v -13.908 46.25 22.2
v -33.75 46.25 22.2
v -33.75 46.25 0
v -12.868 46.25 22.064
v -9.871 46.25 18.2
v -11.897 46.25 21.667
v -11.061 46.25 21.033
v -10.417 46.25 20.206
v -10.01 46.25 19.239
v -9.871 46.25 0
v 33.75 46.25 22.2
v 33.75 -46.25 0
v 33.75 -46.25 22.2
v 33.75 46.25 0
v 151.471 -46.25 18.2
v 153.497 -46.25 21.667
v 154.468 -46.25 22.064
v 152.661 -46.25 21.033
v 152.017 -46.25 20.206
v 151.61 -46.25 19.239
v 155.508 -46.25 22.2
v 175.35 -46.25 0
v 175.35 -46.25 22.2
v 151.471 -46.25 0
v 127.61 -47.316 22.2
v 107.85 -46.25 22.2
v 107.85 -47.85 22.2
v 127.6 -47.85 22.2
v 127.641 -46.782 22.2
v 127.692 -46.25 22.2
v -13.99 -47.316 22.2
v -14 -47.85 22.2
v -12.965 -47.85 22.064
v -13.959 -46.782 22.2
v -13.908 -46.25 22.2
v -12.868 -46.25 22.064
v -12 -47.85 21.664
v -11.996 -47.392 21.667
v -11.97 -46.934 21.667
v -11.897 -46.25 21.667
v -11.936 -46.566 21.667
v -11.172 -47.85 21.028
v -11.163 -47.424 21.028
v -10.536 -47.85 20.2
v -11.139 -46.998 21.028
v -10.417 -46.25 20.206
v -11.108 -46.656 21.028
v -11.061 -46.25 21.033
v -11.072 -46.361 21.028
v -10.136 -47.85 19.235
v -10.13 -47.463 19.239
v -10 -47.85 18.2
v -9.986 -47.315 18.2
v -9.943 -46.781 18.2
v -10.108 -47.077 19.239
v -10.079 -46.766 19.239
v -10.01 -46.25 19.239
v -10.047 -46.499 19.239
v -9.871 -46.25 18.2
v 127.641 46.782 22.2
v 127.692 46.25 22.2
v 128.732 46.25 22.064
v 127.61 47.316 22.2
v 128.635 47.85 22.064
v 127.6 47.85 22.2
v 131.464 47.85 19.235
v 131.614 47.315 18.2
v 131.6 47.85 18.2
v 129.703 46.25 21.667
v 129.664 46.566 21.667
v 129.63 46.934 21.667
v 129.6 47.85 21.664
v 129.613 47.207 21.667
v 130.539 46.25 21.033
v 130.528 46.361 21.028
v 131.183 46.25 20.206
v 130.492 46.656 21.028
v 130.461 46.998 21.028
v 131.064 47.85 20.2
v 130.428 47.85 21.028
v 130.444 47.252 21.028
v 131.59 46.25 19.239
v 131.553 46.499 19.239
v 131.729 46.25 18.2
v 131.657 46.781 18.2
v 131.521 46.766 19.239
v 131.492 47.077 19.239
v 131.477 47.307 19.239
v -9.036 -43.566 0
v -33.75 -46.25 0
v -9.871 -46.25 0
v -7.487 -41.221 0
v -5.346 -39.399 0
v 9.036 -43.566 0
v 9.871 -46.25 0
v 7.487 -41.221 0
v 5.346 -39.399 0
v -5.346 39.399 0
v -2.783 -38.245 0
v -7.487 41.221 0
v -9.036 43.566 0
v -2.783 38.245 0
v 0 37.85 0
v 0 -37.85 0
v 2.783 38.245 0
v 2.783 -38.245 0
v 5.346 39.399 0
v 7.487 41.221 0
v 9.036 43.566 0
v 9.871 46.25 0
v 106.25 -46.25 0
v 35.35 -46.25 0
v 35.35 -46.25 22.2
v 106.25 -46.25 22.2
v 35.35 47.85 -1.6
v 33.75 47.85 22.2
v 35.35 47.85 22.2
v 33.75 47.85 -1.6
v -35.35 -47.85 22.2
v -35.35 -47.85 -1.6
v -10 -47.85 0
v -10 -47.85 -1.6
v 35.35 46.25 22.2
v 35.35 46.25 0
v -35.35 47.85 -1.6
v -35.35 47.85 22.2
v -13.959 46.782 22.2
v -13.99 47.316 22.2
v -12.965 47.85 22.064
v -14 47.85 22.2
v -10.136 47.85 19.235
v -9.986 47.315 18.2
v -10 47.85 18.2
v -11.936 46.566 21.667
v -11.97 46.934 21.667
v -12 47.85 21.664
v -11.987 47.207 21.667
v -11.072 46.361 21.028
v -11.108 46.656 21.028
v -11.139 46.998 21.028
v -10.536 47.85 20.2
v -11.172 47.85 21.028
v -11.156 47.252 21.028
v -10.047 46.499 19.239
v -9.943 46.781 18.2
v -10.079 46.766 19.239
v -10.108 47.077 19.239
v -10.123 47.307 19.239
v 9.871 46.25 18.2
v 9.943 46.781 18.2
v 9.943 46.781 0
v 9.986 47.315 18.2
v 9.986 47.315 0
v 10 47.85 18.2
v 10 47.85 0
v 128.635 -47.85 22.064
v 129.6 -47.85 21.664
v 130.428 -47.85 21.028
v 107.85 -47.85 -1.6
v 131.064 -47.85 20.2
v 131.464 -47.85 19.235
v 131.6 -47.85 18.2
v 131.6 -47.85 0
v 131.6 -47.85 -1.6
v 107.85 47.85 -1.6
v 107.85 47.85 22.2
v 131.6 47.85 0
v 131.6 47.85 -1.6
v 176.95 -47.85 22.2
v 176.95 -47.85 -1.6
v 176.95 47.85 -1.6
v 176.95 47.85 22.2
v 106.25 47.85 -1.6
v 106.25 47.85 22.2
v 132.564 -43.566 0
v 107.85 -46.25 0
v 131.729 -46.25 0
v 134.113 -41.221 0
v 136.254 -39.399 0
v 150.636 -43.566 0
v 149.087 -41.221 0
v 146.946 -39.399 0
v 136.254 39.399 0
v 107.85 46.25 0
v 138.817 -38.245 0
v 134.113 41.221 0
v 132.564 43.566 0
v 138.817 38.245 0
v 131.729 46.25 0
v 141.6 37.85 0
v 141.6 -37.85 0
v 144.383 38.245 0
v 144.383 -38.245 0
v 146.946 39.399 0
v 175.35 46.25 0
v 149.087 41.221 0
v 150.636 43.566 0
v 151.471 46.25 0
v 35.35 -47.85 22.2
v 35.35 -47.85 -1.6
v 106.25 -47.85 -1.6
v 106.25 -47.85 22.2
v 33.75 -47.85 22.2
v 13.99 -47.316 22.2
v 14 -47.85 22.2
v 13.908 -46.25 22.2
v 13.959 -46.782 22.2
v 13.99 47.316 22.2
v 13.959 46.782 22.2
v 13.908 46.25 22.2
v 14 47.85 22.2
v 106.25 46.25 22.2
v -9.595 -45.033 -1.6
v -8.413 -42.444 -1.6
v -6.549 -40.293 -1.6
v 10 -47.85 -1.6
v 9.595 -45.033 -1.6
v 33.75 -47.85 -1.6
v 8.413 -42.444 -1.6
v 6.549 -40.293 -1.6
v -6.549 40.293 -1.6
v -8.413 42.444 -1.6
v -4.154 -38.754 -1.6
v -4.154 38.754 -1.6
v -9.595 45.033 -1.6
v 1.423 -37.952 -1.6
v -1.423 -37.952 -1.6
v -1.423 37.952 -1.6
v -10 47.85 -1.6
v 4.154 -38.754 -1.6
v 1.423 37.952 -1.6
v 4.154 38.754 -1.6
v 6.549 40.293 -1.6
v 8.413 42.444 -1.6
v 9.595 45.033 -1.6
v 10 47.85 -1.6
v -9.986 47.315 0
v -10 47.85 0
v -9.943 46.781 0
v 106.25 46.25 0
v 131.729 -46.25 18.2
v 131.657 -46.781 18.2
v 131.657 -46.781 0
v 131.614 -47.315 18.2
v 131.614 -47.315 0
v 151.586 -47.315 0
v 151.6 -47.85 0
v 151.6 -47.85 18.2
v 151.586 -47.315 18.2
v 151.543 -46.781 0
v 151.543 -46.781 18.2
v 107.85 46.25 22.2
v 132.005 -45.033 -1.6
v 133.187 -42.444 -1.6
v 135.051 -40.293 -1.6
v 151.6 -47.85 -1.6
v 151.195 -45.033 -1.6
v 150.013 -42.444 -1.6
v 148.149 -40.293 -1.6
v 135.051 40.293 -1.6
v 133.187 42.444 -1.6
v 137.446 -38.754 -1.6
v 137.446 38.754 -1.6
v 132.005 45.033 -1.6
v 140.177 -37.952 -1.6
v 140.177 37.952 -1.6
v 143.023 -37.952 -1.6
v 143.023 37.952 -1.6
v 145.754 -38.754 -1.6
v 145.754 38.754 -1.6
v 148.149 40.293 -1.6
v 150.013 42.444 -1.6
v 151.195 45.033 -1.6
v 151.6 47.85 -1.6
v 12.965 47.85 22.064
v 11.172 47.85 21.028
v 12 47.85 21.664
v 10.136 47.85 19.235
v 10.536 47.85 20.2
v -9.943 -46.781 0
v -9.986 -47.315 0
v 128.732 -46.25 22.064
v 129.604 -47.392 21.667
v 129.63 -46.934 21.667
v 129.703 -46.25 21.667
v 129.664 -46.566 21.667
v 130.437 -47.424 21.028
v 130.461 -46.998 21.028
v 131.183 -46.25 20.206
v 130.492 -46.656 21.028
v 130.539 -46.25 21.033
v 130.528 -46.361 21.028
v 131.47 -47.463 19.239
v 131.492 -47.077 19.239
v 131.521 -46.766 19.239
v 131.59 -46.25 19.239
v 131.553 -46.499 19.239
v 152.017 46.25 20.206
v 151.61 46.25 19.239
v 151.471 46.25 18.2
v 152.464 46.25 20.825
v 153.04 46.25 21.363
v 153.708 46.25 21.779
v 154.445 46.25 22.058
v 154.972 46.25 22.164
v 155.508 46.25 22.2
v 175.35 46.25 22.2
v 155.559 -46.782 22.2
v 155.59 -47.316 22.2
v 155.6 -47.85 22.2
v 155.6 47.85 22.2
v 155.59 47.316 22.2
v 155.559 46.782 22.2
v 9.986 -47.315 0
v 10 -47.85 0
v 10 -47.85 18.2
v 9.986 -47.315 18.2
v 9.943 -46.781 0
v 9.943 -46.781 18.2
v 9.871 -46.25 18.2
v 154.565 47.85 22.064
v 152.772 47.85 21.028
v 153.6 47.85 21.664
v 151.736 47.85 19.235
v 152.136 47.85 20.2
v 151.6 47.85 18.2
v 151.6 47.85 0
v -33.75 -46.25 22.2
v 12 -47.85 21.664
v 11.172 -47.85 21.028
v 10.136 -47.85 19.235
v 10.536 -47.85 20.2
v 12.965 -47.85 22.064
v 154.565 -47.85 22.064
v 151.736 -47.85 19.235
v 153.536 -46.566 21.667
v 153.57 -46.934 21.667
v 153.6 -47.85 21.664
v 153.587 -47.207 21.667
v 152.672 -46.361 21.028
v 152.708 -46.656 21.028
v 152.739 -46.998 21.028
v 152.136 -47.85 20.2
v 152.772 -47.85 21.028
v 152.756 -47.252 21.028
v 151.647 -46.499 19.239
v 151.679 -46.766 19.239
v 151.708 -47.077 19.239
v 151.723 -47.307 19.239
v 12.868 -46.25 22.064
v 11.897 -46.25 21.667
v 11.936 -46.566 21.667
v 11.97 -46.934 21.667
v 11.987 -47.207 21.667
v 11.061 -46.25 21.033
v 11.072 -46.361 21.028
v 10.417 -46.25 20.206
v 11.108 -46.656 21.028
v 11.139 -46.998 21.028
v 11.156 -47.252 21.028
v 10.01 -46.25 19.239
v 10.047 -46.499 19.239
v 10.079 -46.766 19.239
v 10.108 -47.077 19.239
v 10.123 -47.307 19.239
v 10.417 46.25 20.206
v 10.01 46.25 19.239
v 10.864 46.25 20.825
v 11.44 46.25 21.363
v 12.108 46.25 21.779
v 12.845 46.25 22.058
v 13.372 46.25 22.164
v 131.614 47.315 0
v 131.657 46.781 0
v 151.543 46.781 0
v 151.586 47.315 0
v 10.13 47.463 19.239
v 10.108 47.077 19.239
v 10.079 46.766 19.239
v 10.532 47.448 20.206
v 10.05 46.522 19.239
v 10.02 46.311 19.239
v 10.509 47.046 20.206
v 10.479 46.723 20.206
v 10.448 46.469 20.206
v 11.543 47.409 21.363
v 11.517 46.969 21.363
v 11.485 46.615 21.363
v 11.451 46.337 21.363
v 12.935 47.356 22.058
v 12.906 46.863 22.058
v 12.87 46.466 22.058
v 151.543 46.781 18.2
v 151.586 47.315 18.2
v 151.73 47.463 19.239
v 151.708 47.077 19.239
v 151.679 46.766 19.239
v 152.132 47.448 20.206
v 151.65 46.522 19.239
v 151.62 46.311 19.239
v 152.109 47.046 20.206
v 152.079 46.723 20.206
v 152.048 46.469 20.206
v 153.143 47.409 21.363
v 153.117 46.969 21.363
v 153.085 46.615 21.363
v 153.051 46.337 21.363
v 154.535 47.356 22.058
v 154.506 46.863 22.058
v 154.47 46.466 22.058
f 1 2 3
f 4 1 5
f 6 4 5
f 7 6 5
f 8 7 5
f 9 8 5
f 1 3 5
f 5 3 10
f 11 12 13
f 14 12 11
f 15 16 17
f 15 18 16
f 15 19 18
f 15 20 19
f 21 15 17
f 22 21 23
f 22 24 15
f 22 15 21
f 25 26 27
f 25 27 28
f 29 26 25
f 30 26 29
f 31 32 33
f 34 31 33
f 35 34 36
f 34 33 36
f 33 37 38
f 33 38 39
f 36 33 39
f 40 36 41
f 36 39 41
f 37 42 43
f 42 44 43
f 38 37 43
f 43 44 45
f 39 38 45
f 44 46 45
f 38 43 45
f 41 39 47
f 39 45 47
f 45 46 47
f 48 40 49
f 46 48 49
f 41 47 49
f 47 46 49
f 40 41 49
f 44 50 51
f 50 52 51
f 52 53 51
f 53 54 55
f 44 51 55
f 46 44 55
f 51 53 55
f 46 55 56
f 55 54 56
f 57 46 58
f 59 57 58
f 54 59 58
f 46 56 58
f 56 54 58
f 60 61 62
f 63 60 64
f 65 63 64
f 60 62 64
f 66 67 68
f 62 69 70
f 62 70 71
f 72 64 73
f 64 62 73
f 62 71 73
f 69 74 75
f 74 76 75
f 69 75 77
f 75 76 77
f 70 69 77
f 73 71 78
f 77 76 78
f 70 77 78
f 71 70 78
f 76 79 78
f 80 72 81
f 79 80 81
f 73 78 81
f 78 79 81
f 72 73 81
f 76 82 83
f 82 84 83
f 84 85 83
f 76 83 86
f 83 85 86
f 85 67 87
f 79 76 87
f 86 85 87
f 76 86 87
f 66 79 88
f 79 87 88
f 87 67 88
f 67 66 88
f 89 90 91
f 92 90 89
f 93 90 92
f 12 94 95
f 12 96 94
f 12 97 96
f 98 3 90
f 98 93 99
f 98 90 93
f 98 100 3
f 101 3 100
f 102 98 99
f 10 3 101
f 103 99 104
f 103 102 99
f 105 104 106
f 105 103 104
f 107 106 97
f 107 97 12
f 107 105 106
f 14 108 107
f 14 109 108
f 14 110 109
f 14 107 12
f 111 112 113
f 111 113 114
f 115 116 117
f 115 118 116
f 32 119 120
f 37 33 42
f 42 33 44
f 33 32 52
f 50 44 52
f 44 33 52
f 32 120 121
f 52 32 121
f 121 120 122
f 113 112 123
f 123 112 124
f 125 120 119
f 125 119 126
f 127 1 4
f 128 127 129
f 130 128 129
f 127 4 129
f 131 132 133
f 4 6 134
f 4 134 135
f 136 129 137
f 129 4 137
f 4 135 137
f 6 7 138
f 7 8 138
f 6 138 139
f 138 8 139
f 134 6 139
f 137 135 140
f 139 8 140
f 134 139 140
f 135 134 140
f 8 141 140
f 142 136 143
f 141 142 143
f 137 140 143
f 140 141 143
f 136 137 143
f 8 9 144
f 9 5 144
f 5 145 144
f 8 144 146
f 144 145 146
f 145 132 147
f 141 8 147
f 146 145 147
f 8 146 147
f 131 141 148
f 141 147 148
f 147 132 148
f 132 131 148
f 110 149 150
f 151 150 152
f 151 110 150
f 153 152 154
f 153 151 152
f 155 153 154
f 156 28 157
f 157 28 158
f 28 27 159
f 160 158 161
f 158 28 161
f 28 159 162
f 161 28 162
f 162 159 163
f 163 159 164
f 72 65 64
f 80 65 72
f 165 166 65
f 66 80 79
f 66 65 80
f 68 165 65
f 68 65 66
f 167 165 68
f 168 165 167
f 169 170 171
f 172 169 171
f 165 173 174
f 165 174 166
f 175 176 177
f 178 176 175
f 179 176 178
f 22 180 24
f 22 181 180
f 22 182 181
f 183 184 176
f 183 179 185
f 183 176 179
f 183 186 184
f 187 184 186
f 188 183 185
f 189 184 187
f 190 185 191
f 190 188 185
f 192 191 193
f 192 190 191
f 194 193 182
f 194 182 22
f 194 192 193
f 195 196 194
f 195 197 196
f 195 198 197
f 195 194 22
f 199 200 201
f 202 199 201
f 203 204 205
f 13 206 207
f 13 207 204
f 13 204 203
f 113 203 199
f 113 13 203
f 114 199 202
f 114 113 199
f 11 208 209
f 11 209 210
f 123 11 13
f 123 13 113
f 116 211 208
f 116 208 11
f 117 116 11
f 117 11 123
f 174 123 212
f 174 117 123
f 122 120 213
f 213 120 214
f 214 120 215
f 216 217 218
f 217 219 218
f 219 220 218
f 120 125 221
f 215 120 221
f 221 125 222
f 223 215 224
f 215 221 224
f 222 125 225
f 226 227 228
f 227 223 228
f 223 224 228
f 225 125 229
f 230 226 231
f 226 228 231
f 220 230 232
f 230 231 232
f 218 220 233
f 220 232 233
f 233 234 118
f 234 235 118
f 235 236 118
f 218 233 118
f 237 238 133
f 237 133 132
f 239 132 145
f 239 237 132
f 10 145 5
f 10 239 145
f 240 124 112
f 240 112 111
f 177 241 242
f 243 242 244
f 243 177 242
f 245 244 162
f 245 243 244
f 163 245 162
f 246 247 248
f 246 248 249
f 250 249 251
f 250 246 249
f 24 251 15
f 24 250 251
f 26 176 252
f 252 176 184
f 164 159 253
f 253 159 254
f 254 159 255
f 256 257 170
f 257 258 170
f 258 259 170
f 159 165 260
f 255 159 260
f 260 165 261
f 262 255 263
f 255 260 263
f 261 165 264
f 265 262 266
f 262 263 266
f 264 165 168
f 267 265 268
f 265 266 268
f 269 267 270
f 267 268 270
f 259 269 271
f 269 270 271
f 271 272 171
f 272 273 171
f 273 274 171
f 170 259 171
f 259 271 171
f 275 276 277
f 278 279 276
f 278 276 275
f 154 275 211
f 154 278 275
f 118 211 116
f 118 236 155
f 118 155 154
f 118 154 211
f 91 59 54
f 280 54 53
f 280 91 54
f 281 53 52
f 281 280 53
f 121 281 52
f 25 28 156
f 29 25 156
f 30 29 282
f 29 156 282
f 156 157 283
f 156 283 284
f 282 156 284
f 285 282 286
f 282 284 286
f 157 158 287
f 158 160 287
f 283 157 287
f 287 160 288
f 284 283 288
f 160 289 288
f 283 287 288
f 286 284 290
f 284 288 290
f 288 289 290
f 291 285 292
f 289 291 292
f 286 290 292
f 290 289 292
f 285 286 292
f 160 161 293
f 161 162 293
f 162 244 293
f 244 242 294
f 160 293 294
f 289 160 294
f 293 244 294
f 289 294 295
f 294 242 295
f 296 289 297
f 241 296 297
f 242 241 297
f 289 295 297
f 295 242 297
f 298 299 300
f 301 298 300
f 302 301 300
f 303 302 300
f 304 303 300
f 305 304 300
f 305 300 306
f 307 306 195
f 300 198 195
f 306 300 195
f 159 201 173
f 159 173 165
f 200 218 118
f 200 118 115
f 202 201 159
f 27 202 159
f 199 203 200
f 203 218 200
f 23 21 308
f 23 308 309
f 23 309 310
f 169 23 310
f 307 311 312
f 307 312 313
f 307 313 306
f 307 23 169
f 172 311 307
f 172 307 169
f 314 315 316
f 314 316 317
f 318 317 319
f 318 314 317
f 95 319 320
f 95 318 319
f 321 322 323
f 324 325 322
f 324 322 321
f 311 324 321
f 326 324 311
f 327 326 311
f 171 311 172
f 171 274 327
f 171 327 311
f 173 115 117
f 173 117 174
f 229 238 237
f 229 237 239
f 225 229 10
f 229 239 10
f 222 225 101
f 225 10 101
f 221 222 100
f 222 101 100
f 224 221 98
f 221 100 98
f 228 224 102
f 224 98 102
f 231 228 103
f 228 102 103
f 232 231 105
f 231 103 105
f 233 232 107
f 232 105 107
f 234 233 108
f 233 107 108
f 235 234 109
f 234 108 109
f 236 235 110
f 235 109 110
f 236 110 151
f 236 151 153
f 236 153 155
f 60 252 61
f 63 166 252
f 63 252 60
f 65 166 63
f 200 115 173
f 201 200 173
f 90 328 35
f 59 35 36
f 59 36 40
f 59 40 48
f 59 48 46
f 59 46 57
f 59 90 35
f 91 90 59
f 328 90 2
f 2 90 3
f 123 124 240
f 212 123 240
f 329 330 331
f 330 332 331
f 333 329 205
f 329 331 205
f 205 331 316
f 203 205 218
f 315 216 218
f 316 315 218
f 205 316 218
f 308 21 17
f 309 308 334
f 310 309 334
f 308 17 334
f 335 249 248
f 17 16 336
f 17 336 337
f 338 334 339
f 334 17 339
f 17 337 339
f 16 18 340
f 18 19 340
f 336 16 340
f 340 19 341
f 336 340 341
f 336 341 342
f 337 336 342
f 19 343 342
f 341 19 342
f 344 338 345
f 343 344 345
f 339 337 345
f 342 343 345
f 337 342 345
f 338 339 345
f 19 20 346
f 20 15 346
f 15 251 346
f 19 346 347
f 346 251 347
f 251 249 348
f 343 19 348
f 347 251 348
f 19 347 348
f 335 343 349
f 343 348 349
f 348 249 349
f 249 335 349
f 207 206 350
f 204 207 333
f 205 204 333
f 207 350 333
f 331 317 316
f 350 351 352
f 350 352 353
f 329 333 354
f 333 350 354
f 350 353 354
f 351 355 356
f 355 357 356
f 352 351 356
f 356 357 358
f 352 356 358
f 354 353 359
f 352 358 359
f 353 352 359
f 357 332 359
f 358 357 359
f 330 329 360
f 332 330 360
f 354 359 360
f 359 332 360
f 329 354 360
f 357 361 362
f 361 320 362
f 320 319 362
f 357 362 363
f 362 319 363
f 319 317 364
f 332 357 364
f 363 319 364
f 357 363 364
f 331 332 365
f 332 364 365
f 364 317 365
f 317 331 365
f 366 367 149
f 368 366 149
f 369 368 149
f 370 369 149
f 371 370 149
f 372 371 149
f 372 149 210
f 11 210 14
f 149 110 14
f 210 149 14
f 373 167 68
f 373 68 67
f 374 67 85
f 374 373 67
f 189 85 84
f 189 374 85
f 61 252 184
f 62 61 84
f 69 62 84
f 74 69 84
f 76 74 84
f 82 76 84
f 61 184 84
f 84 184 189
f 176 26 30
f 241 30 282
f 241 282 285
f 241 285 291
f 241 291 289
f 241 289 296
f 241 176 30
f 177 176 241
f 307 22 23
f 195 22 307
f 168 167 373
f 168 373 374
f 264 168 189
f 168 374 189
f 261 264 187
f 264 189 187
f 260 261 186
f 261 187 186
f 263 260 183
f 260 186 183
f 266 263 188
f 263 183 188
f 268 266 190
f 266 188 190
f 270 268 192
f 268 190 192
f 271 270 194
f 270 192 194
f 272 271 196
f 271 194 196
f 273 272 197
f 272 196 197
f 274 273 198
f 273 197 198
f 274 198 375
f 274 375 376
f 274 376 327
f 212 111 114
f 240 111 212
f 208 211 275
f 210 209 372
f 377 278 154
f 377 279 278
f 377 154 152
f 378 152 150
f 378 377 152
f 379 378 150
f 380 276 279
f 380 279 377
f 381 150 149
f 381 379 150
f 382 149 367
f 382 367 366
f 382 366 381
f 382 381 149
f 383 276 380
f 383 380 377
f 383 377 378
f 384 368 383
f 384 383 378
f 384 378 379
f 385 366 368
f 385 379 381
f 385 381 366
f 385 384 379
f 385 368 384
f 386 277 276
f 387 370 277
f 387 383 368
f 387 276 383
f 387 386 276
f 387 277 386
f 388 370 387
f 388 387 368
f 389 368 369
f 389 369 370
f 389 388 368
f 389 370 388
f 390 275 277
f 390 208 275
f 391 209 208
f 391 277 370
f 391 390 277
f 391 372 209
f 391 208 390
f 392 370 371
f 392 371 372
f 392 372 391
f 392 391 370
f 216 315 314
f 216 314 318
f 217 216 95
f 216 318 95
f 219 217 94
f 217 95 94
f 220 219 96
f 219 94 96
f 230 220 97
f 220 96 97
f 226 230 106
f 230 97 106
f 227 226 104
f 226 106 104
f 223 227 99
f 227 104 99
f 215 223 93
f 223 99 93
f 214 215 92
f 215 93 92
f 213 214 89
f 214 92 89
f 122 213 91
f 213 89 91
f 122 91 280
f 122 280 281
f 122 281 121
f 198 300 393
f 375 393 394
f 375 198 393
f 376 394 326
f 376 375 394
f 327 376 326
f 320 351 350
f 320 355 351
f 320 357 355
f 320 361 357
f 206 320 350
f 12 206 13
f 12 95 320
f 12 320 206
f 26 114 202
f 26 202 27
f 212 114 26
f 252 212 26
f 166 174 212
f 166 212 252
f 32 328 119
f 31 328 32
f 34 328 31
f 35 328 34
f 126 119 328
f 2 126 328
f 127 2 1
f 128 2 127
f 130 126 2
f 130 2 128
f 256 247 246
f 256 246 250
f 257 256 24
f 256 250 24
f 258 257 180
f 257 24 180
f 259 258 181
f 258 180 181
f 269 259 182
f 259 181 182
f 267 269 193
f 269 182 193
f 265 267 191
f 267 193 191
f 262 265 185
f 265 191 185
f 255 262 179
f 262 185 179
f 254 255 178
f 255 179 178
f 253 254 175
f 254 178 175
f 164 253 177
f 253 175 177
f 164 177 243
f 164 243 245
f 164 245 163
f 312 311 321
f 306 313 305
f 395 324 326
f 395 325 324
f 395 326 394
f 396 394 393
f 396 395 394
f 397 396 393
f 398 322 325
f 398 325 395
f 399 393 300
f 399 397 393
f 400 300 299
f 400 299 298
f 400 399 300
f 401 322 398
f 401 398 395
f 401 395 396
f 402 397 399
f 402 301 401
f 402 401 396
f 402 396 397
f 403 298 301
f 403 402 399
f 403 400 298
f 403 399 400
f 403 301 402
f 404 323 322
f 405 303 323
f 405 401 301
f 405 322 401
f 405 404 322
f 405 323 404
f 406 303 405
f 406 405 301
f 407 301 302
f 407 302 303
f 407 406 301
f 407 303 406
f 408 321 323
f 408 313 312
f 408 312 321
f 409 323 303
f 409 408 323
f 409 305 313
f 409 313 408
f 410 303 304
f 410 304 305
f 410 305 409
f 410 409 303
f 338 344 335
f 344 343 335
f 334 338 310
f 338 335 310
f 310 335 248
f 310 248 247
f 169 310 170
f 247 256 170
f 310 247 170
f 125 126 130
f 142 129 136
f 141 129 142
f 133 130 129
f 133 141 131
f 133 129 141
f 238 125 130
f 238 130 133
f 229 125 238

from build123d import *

# Parameters (mm, degrees)
SKETCH112_W          = 70.9
SKETCH112_H          = 92.5
PAD067_DEPTH         = 22.2
THICKNESS047_T       = 1.6
SKETCH110_W          = 67.5
SKETCH110_H          = 92.5
PAD066_DEPTH         = 22.2
THICKNESS046_T       = 1.6
SKETCH111_R          = 10
POCKET039_DEPTH      = 22.201
POCKET039_DEPTH_BACK = 1.601
FILLET014_R          = 4
SKETCH108_W          = 67.5
SKETCH108_H          = 92.5
PAD065_DEPTH         = 22.2
THICKNESS045_T       = 1.6
SKETCH109_R          = 10
POCKET038_DEPTH      = 22.201
POCKET038_DEPTH_BACK = 1.601
FILLET015_R          = 4


with BuildPart() as piecestray001:
    # Sketch112 → Pad067 (new body)
    with BuildSketch(Plane.XY):
        Rectangle(SKETCH112_W, SKETCH112_H)
    extrude(amount=PAD067_DEPTH)

    # Thickness047
    thickness047_openings = [piecestray001.faces().sort_by_distance(p)[0] for p in [
        (0, 0, 22.2),
    ]]
    offset(amount=THICKNESS047_T, openings=thickness047_openings, kind=Kind.INTERSECTION)


with BuildPart() as piecestray001_1:
    # Body059 placement: moved
    add(piecestray001.part.moved(Location((70.8, 0, 0))))


with BuildPart() as discardpile001:
    # Sketch110 → Pad066 (new body)
    with BuildSketch(Plane.XY):
        Rectangle(SKETCH110_W, SKETCH110_H)
    extrude(amount=PAD066_DEPTH)

    # Thickness046
    thickness046_openings = [discardpile001.faces().sort_by_distance(p)[0] for p in [
        (0, 0, 22.2),
    ]]
    offset(amount=THICKNESS046_T, openings=thickness046_openings, kind=Kind.INTERSECTION)

    # Sketch111 → Pocket039 (cut, two sides)
    with BuildSketch(Plane.XY) as pocket039_sk:
        with Locations((0, -47.85)):
            Circle(SKETCH111_R)
        with Locations((0, 47.85)):
            Circle(SKETCH111_R)
    extrude(amount=POCKET039_DEPTH, mode=Mode.SUBTRACT)
    extrude(pocket039_sk.sketch, amount=-POCKET039_DEPTH_BACK, mode=Mode.SUBTRACT)

    # Fillet014
    fillet014_edges = [discardpile001.edges().sort_by_distance(p)[0] for p in [
        (9.967741, 47.047411, 22.2),
        (-9.967741, 47.047411, 22.2),
        (-9.967741, -47.047411, 22.2),
        (9.967741, -47.047411, 22.2),
    ]]
    fillet(fillet014_edges, radius=FILLET014_R)


with BuildPart() as discardpile001_1:
    # Body058 placement: moved
    add(discardpile001.part.moved(Location((141.6, 0, 0))))


with BuildPart() as drawpile001:
    # Sketch108 → Pad065 (new body)
    with BuildSketch(Plane.XY):
        Rectangle(SKETCH108_W, SKETCH108_H)
    extrude(amount=PAD065_DEPTH)

    # Thickness045
    thickness045_openings = [drawpile001.faces().sort_by_distance(p)[0] for p in [
        (0, 0, 22.2),
    ]]
    offset(amount=THICKNESS045_T, openings=thickness045_openings, kind=Kind.INTERSECTION)

    # Sketch109 → Pocket038 (cut, two sides)
    with BuildSketch(Plane.XY) as pocket038_sk:
        with Locations((0, -47.85)):
            Circle(SKETCH109_R)
        with Locations((0, 47.85)):
            Circle(SKETCH109_R)
    extrude(amount=POCKET038_DEPTH, mode=Mode.SUBTRACT)
    extrude(pocket038_sk.sketch, amount=-POCKET038_DEPTH_BACK, mode=Mode.SUBTRACT)

    # Fillet015
    fillet015_edges = [drawpile001.edges().sort_by_distance(p)[0] for p in [
        (-9.967741, 47.047411, 22.2),
        (-9.967741, -47.047411, 22.2),
        (9.967741, 47.047411, 22.2),
        (9.967741, -47.047411, 22.2),
    ]]
    fillet(fillet015_edges, radius=FILLET015_R)

    # Boolean002: union PiecesTray001, DiscardPile001
    add(piecestray001_1.part)
    add(discardpile001_1.part)


solid = drawpile001.part
